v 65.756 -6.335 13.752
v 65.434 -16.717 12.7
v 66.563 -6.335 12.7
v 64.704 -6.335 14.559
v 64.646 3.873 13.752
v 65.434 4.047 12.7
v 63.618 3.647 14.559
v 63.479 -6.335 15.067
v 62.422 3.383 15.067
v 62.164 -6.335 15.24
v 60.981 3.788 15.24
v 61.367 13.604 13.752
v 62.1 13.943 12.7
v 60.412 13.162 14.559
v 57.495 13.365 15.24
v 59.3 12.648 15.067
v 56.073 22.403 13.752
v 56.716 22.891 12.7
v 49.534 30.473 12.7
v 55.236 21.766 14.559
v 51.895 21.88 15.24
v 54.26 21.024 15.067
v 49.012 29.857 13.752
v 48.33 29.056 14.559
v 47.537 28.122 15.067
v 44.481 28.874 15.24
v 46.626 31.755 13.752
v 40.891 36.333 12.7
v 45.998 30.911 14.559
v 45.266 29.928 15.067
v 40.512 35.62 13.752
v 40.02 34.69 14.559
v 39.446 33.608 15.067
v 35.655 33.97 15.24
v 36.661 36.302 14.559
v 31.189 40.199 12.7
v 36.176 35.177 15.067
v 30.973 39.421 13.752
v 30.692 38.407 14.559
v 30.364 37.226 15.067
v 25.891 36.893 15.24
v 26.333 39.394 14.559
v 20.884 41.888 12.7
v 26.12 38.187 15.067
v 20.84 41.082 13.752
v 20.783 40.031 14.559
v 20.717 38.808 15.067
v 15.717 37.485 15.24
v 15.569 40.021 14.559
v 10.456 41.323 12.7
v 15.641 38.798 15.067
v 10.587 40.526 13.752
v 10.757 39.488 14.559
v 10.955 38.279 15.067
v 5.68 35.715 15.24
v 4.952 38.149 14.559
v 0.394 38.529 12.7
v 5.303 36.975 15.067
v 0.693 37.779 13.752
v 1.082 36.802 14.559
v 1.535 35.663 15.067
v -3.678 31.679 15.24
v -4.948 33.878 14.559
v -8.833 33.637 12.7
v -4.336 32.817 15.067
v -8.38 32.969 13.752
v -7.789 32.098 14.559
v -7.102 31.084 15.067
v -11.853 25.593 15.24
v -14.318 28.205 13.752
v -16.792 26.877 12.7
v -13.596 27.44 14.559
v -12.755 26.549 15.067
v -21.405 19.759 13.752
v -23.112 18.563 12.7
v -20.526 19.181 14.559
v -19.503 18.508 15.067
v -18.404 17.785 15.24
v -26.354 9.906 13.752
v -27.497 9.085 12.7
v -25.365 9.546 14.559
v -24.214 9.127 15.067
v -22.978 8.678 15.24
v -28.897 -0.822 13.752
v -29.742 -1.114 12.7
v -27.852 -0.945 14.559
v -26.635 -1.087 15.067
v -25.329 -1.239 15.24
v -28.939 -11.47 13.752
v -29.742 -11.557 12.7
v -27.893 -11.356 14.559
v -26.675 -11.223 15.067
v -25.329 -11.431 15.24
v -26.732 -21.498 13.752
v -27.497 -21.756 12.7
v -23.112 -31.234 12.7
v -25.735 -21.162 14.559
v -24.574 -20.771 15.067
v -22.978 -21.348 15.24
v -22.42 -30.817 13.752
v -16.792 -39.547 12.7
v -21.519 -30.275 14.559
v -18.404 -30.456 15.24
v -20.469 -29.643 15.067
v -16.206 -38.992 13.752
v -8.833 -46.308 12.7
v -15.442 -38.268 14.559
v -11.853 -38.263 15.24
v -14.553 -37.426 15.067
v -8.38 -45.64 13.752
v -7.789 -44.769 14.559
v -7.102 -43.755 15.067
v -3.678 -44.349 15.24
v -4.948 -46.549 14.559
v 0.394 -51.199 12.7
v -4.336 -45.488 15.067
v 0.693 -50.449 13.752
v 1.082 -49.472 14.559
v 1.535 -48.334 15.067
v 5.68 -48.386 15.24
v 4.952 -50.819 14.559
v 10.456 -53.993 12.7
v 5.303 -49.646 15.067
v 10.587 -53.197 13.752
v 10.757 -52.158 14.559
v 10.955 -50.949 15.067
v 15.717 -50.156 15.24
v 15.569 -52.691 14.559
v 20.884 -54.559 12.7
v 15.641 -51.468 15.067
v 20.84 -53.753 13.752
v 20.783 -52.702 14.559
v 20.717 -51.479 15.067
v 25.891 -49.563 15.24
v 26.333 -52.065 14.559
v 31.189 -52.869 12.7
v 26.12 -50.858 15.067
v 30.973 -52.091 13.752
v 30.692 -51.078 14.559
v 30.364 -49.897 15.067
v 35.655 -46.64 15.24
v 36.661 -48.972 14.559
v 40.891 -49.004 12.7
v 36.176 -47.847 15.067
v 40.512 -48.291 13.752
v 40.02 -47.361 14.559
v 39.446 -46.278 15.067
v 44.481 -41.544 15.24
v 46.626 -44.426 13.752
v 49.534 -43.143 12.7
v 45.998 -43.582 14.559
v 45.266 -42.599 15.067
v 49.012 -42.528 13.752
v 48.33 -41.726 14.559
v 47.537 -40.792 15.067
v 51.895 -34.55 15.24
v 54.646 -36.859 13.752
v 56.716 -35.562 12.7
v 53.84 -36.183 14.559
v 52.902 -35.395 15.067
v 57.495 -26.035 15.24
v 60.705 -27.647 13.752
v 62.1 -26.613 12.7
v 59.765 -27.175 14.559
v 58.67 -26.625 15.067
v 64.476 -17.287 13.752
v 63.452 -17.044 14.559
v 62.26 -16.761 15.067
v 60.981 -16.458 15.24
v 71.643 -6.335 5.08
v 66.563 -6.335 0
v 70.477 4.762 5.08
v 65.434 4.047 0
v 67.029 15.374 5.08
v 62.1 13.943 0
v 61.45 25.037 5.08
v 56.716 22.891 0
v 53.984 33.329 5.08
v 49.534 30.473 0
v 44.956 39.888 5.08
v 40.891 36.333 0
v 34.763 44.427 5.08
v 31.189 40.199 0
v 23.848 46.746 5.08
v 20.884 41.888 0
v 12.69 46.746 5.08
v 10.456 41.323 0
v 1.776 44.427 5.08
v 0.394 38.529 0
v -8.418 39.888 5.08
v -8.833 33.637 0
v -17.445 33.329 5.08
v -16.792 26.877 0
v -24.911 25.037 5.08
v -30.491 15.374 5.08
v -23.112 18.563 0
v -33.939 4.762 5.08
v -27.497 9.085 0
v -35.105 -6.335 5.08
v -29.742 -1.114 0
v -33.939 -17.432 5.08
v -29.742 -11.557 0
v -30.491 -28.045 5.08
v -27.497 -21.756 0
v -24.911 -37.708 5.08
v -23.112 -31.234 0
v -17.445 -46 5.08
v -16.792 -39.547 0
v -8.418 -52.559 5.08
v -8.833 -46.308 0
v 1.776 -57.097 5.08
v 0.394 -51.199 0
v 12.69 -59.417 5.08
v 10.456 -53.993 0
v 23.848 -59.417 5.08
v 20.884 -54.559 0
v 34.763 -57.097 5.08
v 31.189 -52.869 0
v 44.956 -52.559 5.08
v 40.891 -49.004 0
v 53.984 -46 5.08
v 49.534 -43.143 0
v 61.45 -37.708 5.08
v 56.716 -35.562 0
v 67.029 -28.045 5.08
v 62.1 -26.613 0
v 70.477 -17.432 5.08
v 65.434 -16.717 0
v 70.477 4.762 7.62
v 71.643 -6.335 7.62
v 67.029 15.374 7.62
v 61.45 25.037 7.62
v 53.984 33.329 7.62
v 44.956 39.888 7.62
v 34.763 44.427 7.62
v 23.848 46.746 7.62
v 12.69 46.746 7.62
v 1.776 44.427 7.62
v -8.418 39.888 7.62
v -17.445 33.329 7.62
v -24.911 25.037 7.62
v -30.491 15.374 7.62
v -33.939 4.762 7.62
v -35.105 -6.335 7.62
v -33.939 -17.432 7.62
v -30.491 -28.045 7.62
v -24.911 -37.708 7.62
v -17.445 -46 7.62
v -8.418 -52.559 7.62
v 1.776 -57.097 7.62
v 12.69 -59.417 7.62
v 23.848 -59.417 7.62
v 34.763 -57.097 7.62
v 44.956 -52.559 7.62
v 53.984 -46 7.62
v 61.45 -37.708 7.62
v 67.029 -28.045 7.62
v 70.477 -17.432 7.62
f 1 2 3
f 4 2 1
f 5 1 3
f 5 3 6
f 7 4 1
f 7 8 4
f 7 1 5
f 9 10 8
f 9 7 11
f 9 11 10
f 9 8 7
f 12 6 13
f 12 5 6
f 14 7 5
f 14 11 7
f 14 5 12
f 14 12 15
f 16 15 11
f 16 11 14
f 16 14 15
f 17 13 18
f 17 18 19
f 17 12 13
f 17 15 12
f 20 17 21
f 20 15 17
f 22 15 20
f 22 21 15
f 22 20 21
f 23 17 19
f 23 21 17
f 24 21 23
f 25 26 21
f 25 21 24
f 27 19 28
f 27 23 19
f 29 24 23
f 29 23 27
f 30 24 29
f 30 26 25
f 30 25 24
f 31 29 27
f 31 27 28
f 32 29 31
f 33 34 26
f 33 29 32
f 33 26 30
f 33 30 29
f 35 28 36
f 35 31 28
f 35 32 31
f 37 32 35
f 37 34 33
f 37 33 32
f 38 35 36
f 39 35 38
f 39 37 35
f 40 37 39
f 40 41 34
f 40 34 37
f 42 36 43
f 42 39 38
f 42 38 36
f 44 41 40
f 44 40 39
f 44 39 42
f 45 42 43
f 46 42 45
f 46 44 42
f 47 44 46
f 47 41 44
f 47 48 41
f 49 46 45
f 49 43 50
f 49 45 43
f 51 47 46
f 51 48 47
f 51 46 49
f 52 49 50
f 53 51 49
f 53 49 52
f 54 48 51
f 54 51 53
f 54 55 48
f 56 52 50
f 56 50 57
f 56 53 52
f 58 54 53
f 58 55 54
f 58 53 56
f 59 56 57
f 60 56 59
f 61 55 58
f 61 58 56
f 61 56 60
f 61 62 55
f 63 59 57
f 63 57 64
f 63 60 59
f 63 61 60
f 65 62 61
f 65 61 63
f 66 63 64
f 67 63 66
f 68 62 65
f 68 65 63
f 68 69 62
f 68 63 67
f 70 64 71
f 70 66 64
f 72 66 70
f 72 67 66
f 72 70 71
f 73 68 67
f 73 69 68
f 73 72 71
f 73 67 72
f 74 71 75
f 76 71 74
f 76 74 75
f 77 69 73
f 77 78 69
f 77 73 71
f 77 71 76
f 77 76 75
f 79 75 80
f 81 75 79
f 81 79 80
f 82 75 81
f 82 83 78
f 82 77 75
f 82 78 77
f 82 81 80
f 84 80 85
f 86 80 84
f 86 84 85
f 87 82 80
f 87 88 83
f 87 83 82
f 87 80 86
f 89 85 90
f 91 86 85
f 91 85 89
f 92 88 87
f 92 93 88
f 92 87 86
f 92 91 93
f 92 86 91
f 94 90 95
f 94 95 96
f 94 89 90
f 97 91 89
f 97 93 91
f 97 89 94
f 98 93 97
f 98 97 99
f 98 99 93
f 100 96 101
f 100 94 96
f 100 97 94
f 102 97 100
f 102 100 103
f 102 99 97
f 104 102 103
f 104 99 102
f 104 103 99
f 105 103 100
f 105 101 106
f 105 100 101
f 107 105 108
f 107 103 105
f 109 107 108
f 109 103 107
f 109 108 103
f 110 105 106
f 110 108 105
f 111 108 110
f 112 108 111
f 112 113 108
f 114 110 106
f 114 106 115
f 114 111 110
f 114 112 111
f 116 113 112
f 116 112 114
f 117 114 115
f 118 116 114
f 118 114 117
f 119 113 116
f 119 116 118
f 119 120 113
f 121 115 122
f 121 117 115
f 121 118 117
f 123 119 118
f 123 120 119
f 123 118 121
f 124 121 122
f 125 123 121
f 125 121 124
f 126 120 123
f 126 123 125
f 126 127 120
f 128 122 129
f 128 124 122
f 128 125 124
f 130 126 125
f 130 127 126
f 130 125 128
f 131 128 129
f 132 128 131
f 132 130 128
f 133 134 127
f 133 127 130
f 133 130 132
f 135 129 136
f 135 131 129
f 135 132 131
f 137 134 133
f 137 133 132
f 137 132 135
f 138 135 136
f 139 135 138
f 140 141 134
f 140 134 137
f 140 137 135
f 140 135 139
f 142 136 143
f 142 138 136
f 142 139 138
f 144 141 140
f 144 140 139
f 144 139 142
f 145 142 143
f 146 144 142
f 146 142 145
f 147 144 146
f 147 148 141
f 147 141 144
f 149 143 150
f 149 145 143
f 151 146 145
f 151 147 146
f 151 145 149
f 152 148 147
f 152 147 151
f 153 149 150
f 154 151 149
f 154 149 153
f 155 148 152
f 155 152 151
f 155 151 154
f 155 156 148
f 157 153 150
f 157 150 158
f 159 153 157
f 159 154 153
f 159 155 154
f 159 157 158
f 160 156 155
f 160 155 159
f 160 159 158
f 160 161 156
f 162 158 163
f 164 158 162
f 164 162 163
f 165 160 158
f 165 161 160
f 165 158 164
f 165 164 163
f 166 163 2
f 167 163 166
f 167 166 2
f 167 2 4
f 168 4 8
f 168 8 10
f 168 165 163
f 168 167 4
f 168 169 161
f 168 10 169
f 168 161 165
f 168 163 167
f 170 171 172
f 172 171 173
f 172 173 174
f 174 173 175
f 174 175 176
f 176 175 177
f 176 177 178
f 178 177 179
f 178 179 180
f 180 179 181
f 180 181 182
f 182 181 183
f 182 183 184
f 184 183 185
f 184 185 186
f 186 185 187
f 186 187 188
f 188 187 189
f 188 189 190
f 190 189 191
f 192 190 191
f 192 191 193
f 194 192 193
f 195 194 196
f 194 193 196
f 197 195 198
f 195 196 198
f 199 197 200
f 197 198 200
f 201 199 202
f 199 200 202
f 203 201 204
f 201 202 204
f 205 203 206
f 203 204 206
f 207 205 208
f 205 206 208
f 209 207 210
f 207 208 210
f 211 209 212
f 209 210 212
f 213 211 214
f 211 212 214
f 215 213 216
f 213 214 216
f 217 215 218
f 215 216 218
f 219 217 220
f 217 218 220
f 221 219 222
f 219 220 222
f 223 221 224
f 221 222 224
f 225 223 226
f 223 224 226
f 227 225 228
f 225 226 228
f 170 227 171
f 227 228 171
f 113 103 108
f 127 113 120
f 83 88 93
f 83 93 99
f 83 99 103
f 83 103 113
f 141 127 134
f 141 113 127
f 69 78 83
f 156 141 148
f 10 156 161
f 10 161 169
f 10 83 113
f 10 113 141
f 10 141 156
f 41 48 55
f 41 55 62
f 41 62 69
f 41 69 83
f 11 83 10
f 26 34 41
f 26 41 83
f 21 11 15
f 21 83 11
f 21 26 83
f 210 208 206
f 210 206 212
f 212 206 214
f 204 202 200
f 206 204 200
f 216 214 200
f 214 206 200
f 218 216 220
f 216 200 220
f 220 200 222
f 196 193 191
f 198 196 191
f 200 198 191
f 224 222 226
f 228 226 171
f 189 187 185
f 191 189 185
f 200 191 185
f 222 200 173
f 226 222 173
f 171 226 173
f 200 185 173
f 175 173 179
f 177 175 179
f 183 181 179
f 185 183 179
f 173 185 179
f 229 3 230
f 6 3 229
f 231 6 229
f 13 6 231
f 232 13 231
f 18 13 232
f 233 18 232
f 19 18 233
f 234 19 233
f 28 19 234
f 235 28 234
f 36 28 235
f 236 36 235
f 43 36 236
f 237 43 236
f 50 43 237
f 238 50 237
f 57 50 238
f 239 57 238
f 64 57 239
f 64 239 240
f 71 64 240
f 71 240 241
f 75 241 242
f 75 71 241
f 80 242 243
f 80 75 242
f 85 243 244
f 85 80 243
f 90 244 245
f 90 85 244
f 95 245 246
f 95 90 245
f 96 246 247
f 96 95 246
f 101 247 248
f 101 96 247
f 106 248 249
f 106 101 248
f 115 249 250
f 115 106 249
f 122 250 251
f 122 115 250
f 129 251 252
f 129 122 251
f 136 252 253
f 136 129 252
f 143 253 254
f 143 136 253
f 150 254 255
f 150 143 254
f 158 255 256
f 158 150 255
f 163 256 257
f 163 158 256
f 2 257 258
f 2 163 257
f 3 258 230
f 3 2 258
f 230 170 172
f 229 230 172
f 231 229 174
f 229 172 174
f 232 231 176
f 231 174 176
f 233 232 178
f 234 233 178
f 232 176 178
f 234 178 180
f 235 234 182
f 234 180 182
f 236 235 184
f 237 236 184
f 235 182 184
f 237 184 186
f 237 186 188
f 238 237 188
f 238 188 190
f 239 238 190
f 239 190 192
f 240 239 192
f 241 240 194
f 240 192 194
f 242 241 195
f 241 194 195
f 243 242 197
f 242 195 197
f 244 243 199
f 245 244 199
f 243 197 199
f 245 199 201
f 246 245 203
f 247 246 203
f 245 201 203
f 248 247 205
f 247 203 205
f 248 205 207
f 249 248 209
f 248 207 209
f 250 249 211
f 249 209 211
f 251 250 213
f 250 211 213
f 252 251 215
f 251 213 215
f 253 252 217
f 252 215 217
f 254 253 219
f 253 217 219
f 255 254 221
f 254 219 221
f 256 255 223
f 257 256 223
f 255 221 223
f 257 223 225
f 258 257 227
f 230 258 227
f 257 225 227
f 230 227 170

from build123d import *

# Parameters (mm, degrees)
F0_R     = 53.3741720423
F1_DEPTH = 12.7
F2_SIZE  = 5.08
F3_DEPTH = 2.54


# Not quite as in the source:
# - a fillet or chamfer that OpenCascade refuses, or shapes differently, is made with other operations: its cross-section is extruded or revolved along the edge and cut away or added


with BuildPart() as f1:
    # F0 (on Top) → F1 (new body)
    with BuildSketch(Plane.XY):
        with Locations((18.2692110538, -6.3352882862)):
            Circle(F0_R)
    extrude(amount=F1_DEPTH)

    # F2
    f2_edges = [f1.edges().sort_by_distance(p)[0] for p in [
        (-35.104961, -6.335288, 12.7),
        (-35.104961, -6.335288, 0),
        (71.643383, -6.335288, 6.35),
    ]]
    chamfer(f2_edges, length=F2_SIZE)

    # F3 (add): a face of the model
    f3_faces = [f1.faces().sort_by_distance(p)[0] for p in [
        (18.2692110538, -6.3352882862, 12.7),
    ]]
    extrude(f3_faces, amount=F3_DEPTH)

    # F4: fillet of radius 5.08 on 1 edges, made by hand

    # F4_s1 → F4_t2 (revolve, cut)
    with BuildSketch(Plane.XZ.offset(6.3352882862)):
        with BuildLine():
            ThreePointArc((66.5633830961, 12.7), (64.7039740449, 14.5594090512), (62.1639740449, 15.24))
            Line((62.1639740449, 15.24), (62.1639740449, 15.3416))
            Line((62.1639740449, 15.3416), (66.5633830961, 15.3416))
            Line((66.5633830961, 15.3416), (66.6649830961, 15.24))
            ThreePointArc((66.6649830961, 15.24), (66.6649830961, 13.97), (66.6513712772, 12.7508))
            Line((66.6513712772, 12.7508), (66.5633830961, 12.7))
        make_face()
    revolve(axis=Axis((18.2692110538, -6.3352882862, 15.24), (0, 0, 1)), mode=Mode.SUBTRACT)


solid = f1.part
